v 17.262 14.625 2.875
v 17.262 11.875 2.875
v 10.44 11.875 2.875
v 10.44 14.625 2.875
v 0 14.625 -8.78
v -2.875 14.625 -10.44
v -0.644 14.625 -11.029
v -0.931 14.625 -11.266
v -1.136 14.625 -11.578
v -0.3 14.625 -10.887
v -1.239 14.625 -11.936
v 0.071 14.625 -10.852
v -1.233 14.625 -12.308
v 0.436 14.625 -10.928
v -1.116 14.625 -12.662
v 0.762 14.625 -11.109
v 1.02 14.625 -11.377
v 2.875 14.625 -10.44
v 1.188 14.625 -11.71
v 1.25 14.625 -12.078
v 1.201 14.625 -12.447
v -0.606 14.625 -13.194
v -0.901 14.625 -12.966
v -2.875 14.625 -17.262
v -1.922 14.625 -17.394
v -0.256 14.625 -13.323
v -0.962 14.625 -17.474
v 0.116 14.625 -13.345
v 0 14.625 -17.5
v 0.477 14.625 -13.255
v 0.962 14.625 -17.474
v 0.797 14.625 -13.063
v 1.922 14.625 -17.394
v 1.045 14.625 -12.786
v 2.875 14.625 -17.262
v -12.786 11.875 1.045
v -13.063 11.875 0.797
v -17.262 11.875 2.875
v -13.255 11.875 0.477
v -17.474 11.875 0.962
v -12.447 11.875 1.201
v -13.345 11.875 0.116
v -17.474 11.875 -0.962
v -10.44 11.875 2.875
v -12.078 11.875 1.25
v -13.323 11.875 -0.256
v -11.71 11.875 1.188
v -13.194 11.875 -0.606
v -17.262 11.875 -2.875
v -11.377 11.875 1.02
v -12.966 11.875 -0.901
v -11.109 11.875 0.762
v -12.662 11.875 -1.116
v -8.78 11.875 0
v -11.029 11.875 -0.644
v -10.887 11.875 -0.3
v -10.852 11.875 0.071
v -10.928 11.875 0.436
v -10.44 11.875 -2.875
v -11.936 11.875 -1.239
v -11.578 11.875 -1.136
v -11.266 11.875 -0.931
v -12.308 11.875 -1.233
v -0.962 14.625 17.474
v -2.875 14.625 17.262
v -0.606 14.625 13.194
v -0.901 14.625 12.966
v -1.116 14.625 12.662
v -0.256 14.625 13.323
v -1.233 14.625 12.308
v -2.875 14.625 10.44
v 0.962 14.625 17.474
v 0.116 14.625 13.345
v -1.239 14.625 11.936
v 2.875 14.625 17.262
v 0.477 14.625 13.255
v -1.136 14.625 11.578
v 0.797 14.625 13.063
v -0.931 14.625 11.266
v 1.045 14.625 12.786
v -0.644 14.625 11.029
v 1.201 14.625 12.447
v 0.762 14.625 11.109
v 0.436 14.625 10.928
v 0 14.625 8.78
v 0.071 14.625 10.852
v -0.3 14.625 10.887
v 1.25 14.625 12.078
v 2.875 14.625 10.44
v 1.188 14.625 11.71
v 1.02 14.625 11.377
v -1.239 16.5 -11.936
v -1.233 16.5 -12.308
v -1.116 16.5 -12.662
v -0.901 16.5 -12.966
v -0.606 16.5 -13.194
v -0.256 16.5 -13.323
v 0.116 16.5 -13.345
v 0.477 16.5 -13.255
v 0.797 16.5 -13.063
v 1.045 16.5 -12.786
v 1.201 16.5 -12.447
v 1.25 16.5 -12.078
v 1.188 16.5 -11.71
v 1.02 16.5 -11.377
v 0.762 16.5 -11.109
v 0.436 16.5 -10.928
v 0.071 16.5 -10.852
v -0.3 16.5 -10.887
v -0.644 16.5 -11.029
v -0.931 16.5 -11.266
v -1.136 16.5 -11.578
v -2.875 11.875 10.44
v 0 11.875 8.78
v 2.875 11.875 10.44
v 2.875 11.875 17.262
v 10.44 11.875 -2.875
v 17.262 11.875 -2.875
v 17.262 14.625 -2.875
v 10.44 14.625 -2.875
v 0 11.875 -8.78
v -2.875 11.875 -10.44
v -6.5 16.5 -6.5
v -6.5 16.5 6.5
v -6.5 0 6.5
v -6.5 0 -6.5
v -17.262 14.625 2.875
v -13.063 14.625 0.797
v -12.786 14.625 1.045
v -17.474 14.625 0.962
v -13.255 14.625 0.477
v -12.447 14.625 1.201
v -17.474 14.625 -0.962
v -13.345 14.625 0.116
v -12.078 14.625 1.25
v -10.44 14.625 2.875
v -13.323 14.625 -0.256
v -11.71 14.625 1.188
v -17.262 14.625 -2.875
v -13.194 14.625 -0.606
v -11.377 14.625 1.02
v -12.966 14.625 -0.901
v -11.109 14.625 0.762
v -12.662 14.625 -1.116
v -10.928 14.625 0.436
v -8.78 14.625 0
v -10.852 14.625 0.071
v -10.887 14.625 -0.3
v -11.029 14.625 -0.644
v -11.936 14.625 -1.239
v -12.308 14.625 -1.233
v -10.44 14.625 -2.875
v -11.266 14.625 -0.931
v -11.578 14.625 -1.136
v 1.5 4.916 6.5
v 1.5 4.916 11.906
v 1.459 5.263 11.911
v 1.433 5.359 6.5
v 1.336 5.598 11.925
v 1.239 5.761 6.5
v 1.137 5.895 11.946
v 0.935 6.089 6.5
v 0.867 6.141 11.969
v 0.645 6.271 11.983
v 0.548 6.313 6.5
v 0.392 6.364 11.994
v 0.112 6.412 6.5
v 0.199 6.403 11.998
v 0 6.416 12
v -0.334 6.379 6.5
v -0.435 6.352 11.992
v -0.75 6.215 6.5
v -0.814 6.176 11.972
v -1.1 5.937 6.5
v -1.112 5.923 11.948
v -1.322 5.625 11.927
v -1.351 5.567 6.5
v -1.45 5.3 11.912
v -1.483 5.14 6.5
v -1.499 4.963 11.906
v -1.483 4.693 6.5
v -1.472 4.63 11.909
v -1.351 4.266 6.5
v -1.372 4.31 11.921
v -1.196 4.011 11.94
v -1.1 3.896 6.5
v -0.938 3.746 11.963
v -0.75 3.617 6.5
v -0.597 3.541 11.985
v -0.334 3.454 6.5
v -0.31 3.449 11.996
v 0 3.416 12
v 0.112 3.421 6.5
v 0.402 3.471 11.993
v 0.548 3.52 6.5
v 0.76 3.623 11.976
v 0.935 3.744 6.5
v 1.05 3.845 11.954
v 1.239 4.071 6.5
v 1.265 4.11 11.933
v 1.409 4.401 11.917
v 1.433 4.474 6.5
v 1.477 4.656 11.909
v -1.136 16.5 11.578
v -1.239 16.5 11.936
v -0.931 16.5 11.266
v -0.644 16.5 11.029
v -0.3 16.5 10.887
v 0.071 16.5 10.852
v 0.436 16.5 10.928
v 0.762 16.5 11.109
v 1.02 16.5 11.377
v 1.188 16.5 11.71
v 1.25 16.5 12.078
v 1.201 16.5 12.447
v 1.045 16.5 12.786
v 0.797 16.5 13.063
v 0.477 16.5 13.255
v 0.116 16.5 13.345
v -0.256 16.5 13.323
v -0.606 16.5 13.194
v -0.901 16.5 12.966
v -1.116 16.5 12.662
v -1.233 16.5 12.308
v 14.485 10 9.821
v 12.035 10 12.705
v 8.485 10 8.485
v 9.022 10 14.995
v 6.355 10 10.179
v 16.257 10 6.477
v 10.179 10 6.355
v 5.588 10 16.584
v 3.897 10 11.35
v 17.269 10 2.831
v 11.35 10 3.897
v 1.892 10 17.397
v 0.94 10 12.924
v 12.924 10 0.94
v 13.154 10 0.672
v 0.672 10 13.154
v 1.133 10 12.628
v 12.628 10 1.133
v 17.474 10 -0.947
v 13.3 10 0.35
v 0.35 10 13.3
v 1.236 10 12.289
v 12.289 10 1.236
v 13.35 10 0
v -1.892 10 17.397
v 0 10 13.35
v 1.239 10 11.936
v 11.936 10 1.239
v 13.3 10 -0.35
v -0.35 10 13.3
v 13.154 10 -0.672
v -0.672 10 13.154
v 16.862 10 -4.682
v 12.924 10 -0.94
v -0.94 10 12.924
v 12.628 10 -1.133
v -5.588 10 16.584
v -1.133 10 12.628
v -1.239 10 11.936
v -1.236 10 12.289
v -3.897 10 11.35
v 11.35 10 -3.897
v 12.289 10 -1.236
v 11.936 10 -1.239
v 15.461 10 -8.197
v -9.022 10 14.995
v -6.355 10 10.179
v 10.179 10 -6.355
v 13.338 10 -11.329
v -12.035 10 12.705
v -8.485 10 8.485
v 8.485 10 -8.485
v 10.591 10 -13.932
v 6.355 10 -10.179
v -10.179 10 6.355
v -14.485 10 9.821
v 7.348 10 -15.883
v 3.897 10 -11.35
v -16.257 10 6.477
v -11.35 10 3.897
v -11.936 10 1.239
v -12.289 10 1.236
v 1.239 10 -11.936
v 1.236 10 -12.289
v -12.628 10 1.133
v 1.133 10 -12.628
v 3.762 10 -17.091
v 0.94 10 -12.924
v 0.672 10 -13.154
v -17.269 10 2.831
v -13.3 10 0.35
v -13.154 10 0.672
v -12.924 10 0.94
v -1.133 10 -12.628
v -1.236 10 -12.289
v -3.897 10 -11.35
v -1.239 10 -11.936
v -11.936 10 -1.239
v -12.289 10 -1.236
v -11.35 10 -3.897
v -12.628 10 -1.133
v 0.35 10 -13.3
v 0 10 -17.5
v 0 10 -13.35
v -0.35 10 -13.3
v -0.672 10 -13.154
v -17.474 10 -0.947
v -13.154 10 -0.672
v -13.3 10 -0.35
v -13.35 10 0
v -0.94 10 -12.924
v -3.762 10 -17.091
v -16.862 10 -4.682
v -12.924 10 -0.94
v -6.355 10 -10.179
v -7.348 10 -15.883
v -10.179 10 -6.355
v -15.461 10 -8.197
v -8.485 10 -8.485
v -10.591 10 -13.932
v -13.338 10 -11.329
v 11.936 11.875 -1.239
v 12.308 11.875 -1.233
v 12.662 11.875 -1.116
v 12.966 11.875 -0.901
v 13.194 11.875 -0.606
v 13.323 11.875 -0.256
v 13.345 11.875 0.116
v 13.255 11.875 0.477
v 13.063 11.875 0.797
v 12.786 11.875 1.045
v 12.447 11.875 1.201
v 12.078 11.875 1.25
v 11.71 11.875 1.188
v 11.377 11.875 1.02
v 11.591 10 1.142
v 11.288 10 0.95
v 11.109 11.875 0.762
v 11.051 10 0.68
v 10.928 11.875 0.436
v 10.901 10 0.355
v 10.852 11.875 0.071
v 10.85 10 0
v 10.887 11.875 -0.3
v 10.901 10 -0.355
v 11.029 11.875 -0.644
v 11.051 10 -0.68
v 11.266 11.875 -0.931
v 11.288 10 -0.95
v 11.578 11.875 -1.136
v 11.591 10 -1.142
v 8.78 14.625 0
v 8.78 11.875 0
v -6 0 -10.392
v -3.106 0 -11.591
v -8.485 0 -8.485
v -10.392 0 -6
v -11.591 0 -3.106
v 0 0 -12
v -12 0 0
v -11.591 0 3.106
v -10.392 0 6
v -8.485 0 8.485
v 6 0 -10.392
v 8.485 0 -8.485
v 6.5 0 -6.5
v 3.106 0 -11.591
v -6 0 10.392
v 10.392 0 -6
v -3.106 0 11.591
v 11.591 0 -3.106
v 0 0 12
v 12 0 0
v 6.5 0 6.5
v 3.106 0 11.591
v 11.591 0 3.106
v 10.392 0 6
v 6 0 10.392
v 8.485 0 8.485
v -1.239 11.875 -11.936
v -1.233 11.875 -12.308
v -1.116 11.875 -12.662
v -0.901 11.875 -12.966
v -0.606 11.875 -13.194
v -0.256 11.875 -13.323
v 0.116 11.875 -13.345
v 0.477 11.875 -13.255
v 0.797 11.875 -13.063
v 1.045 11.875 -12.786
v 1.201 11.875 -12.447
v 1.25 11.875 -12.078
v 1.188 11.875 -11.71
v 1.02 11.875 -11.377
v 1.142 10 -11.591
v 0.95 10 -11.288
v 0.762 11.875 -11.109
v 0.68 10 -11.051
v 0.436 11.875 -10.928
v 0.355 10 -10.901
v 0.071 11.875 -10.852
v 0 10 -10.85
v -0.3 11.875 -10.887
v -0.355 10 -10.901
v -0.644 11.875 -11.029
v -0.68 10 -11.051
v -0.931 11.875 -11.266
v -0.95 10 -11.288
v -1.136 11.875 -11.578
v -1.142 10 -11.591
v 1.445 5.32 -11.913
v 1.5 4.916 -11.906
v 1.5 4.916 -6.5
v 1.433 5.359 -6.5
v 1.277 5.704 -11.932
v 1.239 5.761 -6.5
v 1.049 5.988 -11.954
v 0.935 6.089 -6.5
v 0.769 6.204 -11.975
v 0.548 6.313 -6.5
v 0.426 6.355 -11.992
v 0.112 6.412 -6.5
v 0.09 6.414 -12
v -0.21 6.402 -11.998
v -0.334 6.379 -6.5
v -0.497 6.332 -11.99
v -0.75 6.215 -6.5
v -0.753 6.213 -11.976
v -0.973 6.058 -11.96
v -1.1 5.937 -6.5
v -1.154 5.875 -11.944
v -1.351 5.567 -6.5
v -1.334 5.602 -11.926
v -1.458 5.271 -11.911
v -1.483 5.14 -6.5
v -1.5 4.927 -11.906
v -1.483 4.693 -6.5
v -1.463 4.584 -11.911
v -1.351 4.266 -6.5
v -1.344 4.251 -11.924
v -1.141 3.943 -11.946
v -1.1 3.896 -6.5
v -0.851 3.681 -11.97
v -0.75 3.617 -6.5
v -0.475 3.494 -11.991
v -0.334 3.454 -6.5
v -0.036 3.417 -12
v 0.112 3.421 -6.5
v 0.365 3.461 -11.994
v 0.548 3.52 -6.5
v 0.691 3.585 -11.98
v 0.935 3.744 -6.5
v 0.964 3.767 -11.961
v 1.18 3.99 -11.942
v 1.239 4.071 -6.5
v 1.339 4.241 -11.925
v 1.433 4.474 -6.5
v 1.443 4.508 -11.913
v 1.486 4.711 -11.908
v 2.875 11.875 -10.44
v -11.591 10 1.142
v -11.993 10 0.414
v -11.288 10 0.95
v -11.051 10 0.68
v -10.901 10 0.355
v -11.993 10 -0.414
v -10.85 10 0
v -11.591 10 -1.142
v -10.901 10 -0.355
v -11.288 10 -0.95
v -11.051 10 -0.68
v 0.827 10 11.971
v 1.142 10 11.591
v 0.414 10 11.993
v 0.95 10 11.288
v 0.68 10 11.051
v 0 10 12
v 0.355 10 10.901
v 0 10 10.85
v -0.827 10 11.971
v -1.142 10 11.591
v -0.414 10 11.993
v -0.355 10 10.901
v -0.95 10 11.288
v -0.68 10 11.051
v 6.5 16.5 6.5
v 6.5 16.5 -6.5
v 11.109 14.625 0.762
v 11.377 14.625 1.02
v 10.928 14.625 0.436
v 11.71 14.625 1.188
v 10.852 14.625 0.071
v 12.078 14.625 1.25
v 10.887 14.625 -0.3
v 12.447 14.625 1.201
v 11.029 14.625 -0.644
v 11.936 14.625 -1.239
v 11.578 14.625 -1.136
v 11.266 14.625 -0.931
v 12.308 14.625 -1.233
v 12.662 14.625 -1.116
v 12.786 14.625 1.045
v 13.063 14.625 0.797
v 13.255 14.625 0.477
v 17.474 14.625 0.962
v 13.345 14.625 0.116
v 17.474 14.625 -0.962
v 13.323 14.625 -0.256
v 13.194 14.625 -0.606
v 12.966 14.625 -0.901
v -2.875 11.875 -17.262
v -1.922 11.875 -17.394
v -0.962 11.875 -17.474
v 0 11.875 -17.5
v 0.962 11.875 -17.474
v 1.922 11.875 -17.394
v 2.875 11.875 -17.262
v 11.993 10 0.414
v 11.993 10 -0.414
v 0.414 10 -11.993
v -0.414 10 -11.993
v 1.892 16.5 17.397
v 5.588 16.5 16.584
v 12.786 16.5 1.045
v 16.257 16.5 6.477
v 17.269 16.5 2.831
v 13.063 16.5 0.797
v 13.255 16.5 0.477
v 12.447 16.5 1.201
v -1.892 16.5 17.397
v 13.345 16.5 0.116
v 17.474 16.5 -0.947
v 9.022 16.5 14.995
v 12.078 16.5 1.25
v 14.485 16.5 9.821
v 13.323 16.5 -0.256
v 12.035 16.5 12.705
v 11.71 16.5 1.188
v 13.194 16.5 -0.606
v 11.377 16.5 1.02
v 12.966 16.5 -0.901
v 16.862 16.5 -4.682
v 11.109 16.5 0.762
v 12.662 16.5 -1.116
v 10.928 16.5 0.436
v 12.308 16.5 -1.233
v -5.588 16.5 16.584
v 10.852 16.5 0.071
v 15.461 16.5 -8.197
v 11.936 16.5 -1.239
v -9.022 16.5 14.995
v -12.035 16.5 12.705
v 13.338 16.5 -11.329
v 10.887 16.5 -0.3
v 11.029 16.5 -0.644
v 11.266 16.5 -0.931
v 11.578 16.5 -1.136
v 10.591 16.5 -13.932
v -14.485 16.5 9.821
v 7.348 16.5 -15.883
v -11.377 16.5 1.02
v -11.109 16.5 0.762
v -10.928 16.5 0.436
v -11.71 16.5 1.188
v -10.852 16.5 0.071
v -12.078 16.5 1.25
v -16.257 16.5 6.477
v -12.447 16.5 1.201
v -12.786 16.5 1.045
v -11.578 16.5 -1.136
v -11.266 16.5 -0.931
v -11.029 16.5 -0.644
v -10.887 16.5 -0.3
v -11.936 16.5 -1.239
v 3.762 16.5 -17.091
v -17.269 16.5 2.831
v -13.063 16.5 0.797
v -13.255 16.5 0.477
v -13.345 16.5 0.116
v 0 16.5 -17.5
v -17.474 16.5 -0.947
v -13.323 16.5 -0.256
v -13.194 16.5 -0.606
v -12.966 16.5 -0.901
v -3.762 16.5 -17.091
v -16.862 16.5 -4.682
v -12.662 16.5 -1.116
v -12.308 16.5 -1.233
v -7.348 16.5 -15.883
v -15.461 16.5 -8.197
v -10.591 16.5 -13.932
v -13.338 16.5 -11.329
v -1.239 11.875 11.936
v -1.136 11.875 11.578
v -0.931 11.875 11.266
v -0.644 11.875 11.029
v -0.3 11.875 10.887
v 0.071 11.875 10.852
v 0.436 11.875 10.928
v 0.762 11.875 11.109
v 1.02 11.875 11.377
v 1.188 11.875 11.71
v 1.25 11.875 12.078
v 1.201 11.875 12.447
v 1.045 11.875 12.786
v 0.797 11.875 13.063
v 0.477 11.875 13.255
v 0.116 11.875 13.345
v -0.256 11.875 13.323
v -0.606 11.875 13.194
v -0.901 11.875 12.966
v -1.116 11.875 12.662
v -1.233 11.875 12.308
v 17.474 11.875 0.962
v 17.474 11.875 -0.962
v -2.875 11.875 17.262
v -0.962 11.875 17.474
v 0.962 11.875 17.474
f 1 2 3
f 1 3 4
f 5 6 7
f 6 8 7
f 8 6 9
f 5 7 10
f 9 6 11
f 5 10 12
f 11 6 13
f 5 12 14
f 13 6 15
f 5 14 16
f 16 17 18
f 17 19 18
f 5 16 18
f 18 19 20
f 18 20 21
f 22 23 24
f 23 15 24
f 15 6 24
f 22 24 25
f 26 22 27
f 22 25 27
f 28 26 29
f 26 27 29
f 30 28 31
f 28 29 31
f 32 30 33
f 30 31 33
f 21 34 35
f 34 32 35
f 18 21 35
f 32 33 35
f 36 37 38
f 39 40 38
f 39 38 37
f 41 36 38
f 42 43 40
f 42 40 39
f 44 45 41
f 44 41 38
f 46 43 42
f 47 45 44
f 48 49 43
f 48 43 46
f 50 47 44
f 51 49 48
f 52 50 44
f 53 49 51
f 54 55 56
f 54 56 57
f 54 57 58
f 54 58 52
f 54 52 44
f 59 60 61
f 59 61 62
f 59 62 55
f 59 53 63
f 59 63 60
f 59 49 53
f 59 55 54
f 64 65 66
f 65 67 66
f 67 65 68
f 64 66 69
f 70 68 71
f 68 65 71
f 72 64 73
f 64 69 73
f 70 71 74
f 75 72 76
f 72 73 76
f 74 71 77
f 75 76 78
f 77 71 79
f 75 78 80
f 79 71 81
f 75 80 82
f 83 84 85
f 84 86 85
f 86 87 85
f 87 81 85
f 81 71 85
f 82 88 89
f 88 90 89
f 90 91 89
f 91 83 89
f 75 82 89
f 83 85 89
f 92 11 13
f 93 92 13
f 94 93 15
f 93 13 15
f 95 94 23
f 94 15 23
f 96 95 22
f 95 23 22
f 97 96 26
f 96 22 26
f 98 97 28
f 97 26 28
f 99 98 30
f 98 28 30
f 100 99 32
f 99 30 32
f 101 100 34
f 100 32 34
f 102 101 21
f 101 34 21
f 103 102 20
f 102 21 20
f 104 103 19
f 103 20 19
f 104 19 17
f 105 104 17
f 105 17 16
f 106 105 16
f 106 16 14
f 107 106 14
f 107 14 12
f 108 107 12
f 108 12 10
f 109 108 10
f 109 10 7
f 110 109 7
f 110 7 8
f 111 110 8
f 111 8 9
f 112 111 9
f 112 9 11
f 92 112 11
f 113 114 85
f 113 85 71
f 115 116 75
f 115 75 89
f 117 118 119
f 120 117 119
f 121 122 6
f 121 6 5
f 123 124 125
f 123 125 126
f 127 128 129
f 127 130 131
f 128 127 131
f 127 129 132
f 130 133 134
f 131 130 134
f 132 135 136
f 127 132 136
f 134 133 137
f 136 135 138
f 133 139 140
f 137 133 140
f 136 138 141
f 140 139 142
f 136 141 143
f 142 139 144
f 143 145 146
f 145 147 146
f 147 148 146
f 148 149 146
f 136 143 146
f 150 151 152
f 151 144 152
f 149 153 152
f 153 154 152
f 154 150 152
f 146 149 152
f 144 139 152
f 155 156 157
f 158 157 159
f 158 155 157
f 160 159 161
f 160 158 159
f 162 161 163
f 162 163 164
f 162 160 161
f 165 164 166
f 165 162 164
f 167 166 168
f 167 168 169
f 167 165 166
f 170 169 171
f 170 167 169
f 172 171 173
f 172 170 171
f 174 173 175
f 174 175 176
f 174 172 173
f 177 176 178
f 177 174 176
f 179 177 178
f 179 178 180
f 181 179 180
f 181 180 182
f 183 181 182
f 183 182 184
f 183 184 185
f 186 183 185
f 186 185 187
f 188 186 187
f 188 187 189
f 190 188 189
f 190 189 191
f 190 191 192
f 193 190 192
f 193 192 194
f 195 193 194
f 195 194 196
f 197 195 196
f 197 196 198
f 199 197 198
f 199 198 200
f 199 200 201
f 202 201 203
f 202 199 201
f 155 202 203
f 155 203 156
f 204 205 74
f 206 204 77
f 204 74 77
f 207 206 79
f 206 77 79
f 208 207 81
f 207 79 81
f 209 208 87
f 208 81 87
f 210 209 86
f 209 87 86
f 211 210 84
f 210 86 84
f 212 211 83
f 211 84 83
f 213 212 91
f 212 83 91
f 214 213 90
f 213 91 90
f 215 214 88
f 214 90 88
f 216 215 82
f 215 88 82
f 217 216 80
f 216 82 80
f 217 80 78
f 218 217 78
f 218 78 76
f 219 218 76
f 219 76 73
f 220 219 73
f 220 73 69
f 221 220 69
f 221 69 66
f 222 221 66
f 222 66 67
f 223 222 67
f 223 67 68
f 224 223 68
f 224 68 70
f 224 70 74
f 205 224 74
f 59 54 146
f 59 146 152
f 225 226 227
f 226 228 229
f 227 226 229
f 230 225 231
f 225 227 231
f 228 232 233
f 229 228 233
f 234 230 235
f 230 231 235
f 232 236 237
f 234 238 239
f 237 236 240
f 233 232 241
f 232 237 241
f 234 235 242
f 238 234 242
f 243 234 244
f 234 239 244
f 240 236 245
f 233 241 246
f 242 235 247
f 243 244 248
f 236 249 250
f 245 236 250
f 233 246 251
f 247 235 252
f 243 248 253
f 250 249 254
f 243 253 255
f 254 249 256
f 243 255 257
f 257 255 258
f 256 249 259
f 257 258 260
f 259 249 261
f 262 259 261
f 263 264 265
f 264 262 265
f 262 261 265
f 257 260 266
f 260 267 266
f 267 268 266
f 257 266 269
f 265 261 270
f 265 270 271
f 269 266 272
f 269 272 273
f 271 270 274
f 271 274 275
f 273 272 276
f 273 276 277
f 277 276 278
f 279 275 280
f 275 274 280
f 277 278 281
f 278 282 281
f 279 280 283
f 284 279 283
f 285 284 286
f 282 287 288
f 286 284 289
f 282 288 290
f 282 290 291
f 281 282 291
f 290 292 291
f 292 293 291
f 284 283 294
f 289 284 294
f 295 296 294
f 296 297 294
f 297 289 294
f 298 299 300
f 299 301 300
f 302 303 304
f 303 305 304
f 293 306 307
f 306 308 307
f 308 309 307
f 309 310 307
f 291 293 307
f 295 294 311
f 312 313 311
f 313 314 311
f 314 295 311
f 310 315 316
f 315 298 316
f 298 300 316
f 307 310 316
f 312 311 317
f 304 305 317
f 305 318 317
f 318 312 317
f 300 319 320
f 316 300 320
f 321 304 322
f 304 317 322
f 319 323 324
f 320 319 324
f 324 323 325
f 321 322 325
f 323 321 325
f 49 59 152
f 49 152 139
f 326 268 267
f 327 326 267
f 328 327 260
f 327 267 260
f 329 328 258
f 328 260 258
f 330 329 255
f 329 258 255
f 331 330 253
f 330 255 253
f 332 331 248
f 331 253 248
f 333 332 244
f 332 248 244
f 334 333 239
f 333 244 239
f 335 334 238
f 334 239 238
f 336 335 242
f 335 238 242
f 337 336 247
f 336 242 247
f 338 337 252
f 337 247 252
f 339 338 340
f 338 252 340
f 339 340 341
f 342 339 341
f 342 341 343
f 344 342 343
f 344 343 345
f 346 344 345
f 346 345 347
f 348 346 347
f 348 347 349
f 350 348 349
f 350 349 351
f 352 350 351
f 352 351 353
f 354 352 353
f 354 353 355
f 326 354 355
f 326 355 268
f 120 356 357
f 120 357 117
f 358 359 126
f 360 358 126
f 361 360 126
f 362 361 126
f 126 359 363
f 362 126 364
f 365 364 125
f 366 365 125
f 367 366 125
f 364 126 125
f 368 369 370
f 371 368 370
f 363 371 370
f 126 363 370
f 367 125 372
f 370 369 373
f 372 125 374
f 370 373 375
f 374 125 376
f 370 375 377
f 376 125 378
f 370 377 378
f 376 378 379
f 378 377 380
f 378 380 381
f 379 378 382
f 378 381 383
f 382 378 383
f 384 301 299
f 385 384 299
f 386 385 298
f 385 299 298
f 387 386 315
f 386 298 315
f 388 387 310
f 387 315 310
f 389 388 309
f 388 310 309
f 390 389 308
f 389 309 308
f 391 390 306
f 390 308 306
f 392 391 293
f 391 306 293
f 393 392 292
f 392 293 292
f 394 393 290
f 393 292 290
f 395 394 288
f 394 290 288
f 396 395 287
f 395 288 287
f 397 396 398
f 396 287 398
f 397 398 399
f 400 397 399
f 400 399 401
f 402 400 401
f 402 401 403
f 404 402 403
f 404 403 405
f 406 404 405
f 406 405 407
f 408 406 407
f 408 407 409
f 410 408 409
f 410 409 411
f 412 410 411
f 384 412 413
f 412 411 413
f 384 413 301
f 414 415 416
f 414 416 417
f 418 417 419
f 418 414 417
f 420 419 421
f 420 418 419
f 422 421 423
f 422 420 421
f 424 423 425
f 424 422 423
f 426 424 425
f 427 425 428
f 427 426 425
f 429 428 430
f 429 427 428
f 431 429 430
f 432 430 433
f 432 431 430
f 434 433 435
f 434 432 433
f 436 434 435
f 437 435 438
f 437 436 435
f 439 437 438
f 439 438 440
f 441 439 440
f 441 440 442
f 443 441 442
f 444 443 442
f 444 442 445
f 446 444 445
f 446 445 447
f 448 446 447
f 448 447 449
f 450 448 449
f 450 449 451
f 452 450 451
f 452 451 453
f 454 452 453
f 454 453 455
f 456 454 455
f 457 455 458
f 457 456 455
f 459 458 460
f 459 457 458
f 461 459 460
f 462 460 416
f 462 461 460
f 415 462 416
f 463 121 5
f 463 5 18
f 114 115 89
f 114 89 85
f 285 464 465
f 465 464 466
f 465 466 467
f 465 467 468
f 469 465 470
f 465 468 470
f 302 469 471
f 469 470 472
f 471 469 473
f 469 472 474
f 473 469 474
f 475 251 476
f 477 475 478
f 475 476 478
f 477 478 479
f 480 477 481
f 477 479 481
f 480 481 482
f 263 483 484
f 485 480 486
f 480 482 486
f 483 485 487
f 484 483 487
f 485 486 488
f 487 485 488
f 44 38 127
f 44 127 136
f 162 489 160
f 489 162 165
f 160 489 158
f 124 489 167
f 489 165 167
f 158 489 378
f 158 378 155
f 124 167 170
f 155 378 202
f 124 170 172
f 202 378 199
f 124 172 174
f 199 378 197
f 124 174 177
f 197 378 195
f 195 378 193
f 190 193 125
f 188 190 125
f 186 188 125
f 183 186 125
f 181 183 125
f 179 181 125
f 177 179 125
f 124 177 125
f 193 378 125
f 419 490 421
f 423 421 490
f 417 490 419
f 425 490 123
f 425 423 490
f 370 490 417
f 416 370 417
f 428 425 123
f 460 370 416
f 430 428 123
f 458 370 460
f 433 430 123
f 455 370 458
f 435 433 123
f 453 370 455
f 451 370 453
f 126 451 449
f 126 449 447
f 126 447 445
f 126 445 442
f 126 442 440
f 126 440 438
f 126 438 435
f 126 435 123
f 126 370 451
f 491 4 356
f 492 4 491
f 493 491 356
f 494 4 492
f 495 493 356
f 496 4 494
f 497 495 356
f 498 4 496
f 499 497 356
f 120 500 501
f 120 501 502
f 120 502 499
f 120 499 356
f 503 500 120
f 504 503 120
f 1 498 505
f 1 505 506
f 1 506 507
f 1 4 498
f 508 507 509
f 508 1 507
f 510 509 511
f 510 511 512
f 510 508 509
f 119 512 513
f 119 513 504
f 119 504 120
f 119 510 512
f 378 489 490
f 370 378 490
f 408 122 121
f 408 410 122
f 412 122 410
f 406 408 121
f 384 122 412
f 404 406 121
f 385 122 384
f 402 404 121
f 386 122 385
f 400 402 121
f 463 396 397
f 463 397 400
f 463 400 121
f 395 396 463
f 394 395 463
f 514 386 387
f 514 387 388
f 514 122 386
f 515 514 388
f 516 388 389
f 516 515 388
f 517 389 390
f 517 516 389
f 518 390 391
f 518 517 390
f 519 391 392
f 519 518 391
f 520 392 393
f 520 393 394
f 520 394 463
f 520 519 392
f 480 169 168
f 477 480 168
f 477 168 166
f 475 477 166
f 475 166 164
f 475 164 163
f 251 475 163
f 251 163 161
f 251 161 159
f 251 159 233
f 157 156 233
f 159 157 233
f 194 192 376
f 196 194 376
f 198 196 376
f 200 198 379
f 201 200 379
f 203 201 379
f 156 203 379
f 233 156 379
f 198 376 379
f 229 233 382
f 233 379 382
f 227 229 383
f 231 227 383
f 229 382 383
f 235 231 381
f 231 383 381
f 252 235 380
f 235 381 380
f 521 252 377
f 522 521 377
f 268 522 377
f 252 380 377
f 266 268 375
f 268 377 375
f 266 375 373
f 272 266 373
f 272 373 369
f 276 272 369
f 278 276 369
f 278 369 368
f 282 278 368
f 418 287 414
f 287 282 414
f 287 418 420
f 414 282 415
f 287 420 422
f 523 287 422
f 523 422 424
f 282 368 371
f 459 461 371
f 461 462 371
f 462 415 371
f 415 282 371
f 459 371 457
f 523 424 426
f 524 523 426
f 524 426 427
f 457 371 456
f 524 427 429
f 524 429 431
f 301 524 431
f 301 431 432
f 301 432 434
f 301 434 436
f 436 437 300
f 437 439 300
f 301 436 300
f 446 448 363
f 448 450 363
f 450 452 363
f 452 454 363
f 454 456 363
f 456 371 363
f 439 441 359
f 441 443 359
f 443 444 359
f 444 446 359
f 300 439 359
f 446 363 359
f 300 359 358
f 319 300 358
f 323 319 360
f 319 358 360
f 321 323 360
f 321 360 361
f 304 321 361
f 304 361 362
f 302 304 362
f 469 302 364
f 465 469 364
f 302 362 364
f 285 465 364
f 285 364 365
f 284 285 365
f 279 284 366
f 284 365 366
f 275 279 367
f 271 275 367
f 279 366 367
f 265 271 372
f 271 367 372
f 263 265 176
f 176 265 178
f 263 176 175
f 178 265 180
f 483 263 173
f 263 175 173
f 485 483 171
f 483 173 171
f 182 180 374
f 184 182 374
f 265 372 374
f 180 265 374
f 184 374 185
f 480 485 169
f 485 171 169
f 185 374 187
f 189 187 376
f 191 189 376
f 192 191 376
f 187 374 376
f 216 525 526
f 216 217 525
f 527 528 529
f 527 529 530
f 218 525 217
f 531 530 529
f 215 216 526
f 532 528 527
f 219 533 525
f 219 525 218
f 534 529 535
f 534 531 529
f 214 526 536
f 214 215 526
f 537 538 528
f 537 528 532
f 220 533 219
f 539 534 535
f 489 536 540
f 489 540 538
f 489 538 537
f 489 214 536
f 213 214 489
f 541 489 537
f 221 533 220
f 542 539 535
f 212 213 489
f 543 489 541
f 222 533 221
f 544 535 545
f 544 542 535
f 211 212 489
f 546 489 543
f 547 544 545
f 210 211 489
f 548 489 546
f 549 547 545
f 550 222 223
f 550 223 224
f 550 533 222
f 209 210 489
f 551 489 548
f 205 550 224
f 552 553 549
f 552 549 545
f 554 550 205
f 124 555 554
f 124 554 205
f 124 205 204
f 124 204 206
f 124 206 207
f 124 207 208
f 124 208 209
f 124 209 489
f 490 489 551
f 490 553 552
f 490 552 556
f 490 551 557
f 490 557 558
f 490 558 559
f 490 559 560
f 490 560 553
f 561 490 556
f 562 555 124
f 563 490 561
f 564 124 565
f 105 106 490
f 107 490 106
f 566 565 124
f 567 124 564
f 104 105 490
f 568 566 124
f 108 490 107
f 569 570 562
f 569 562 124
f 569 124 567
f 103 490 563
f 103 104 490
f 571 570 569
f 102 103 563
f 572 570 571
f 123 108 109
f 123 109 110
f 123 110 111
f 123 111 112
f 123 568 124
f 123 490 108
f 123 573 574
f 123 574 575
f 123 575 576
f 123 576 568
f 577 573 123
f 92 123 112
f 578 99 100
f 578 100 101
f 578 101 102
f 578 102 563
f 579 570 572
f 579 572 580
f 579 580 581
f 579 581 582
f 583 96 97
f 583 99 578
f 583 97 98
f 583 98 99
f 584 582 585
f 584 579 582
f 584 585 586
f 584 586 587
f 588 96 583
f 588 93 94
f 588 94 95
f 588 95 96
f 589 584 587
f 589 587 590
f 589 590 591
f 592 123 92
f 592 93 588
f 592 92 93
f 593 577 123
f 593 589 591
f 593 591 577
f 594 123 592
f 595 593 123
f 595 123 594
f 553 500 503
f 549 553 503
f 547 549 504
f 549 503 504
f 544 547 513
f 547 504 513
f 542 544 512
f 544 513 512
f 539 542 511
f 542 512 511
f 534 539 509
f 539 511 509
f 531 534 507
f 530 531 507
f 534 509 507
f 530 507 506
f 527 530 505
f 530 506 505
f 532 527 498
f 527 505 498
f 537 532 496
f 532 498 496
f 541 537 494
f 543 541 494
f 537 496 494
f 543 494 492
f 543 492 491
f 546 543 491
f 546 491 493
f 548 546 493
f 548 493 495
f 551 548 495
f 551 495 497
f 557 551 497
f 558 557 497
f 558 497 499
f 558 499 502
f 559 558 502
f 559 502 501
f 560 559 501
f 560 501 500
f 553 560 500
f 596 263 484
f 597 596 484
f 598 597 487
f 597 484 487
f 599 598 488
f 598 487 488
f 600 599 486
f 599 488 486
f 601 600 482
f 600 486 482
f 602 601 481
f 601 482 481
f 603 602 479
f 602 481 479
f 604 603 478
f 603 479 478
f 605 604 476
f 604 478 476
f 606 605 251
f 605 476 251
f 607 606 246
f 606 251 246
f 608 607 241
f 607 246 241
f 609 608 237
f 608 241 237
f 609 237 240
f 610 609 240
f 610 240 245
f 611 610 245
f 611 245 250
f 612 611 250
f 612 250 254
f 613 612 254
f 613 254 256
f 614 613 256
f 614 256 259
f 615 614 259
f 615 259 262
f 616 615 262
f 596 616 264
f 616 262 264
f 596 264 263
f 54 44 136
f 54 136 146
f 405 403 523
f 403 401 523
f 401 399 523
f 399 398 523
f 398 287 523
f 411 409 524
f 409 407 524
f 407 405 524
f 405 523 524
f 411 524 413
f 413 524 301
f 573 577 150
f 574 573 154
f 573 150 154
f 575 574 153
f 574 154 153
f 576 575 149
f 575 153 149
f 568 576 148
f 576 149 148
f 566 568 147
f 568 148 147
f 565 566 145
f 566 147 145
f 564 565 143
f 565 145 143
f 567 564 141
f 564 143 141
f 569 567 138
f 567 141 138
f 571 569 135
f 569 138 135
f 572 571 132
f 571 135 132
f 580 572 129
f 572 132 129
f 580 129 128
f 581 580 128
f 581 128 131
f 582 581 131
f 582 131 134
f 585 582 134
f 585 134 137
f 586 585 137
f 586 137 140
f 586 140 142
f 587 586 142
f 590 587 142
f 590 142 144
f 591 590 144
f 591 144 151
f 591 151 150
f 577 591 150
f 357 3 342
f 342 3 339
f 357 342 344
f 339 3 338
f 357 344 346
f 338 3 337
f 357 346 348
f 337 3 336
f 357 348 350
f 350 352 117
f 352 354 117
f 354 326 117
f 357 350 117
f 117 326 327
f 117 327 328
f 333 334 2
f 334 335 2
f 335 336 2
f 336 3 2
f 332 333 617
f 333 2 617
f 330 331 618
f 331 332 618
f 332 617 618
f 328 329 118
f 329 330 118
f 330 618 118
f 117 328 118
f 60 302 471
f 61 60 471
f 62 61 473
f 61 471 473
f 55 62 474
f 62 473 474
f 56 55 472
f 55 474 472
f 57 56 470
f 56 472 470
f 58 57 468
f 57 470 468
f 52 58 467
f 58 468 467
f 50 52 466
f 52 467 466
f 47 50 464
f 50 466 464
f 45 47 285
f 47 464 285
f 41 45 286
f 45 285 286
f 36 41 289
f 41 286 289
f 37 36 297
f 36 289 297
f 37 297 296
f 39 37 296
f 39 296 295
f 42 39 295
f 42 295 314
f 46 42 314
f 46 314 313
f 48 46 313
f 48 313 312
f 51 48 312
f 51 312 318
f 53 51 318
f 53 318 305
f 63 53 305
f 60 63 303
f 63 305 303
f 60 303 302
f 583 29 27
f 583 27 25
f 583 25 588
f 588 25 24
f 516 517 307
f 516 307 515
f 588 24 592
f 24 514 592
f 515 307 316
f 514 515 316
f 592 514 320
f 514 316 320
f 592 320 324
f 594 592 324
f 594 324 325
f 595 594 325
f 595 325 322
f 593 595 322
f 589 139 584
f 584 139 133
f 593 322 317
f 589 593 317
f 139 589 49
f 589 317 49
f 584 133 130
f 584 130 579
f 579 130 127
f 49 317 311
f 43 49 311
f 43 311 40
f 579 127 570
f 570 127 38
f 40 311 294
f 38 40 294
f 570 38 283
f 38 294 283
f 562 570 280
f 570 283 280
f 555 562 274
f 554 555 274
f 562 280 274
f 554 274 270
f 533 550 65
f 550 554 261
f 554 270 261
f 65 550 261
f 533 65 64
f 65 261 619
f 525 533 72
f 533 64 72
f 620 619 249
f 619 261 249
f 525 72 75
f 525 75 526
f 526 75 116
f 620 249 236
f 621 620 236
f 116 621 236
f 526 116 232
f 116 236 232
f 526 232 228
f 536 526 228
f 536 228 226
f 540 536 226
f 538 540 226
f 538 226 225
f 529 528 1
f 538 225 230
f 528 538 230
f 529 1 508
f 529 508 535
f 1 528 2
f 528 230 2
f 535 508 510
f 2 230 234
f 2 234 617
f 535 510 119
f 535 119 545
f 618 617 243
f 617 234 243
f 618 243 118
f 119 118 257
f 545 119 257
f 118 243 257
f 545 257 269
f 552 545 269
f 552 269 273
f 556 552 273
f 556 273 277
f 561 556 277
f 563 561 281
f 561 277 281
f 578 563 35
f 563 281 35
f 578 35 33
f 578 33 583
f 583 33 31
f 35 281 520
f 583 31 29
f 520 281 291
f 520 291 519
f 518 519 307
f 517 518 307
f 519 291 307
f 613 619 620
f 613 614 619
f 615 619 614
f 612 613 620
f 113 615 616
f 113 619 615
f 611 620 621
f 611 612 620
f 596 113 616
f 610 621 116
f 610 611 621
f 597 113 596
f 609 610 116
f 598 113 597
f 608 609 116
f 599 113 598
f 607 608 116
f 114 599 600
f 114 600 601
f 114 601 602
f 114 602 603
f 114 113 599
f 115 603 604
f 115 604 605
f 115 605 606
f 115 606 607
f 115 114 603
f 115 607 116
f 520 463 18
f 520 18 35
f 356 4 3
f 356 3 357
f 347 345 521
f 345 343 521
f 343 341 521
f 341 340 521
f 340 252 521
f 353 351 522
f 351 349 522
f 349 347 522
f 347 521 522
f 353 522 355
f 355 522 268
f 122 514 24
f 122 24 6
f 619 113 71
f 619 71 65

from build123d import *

# Parameters (mm, degrees)
SKETCH1_R                      = 12
SKETCH1_W                      = 13
SKETCH1_H                      = 13
BOSS_EXTRUDE1_DEPTH            = 10
SKETCH2_R                      = 17.5
BOSS_EXTRUDE2_DEPTH            = 6.5
CUT_EXTRUDE1_REACH             = 28.693
SKETCH3_R                      = 1.25
CUT_EXTRUDE2_DEPTH             = 30.744747435
CUT_EXTRUDE2_DEPTH_BACK        = 30.744747435
SKETCH4_R                      = 1.5
CUT_EXTRUDE3_REACH             = 28.693
SKETCH6_W                      = 13
SKETCH6_H                      = 13
CUT_EXTRUDE3_DIRECTION_2_DEPTH = 10
SKETCH8_W                      = 5.75
SKETCH8_H                      = 2.75
CUT_EXTRUDE4_DEPTH             = 5
CUT_EXTRUDE5_DEPTH             = 2.75
CIRPATTERN1_START              = 11.875
CIRPATTERN1_OUTLINE_R          = 1.25
CIRPATTERN1_DEPTH              = 2.75


# Read off the part's stored shape, not the designer's step: CirPattern1
with BuildPart() as part:
    # Sketch1 → Boss-Extrude1 (new body)
    with BuildSketch(Plane(origin=(0, 0, 0), x_dir=(1, 0, 0), z_dir=(0, 1, 0))):
        with Locations(Location((0, 0, 0), (0, 0, 270))):
            Circle(SKETCH1_R)
        Rectangle(SKETCH1_W, SKETCH1_H, mode=Mode.SUBTRACT)
    extrude(amount=BOSS_EXTRUDE1_DEPTH)

    # Sketch2 → Boss-Extrude2 (add)
    with BuildSketch(Plane(origin=(0, 10, 0), x_dir=(1, 0, 0), z_dir=(0, 1, 0))):
        with Locations(Location((0, 0, 0), (0, 0, 90))):
            Circle(SKETCH2_R)
    extrude(amount=BOSS_EXTRUDE2_DEPTH)

    # Sketch3 → Cut-Extrude1 (cut, up to next)
    with BuildSketch(Plane.XZ.offset(-10), mode=Mode.PRIVATE) as cut_extrude1_sk1:
        with Locations(Location((12.1, 0, 0), (0, 0, 262.453989537))):
            Circle(SKETCH3_R)
    cut_extrude1_tool1 = extrude(cut_extrude1_sk1.sketch, amount=-CUT_EXTRUDE1_REACH, mode=Mode.PRIVATE) & part.part
    # Sketch3 → Cut-Extrude1 (cut, up to next)
    with BuildSketch(Plane.XZ.offset(-10), mode=Mode.PRIVATE) as cut_extrude1_sk2:
        with Locations(Location((0, -12.1, 0), (0, 0, 172.453989537))):
            Circle(SKETCH3_R)
    cut_extrude1_tool2 = extrude(cut_extrude1_sk2.sketch, amount=-CUT_EXTRUDE1_REACH, mode=Mode.PRIVATE) & part.part
    # Sketch3 → Cut-Extrude1 (cut, up to next)
    with BuildSketch(Plane.XZ.offset(-10), mode=Mode.PRIVATE) as cut_extrude1_sk3:
        with Locations(Location((-12.1, 0, 0), (0, 0, 277.546010463))):
            Circle(SKETCH3_R)
    cut_extrude1_tool3 = extrude(cut_extrude1_sk3.sketch, amount=-CUT_EXTRUDE1_REACH, mode=Mode.PRIVATE) & part.part
    # Sketch3 → Cut-Extrude1 (cut, up to next)
    with BuildSketch(Plane.XZ.offset(-10), mode=Mode.PRIVATE) as cut_extrude1_sk4:
        with Locations(Location((0, 12.1, 0), (0, 0, 187.546010463))):
            Circle(SKETCH3_R)
    cut_extrude1_tool4 = extrude(cut_extrude1_sk4.sketch, amount=-CUT_EXTRUDE1_REACH, mode=Mode.PRIVATE) & part.part
    add(cut_extrude1_tool1.solids().sort_by_distance((12.1, 10, 0))[0], mode=Mode.SUBTRACT)
    add(cut_extrude1_tool2.solids().sort_by_distance((0, 10, -12.1))[0], mode=Mode.SUBTRACT)
    add(cut_extrude1_tool3.solids().sort_by_distance((-12.1, 10, 0))[0], mode=Mode.SUBTRACT)
    add(cut_extrude1_tool4.solids().sort_by_distance((0, 10, 12.1))[0], mode=Mode.SUBTRACT)

    # Sketch4 → Cut-Extrude2 (cut, two sides: drawn at the far end of the back side and taken through both)
    with BuildSketch(Plane.XY.offset(-CUT_EXTRUDE2_DEPTH_BACK)):
        with Locations((0, 4.916404418)):
            Circle(SKETCH4_R)
    extrude(amount=CUT_EXTRUDE2_DEPTH + CUT_EXTRUDE2_DEPTH_BACK, mode=Mode.SUBTRACT)

    # Sketch6 → Cut-Extrude3 (cut, up to next)
    with BuildSketch(Plane(origin=(0, 10, 0), x_dir=(-1, 0, 0), z_dir=(0, -1, 0)), mode=Mode.PRIVATE) as cut_extrude3_sk1:
        Rectangle(SKETCH6_W, SKETCH6_H)
    cut_extrude3_tool1 = extrude(cut_extrude3_sk1.sketch, amount=-CUT_EXTRUDE3_REACH, mode=Mode.PRIVATE) & part.part
    add(cut_extrude3_tool1.solids().sort_by_distance((0, 10, 0))[0], mode=Mode.SUBTRACT)

    # Sketch6 → Cut-Extrude3 direction 2 (cut)
    with BuildSketch(Plane(origin=(0, 10, 0), x_dir=(-1, 0, 0), z_dir=(0, -1, 0))):
        Rectangle(SKETCH6_W, SKETCH6_H)
    extrude(amount=CUT_EXTRUDE3_DIRECTION_2_DEPTH, mode=Mode.SUBTRACT)

    # Sketch8 → Cut-Extrude4 (cut)
    with BuildSketch(Plane(origin=(17.5, 0, 0), x_dir=(0, 0, -1), z_dir=(1, 0, 0))):
        with Locations((0, 13.25)):
            Rectangle(SKETCH8_W, SKETCH8_H)
    extrude(amount=-CUT_EXTRUDE4_DEPTH, mode=Mode.SUBTRACT)

    # Sketch9 → Cut-Extrude5 (cut)
    with BuildSketch(Plane.XZ.offset(-14.625)):
        Polygon((15.419764048, 0), (13.759882024, 2.875), (10.440117976, 2.875), (8.780235952, 0), (10.440117976, -2.875), (13.759882024, -2.875), align=None)
    extrude(amount=CUT_EXTRUDE5_DEPTH, mode=Mode.SUBTRACT)

    # CirPattern1 outline → CirPattern1 (cut)
    # profile 1 of 3: a face of its own
    with BuildSketch(Plane(origin=(0, 0, 0), x_dir=(1, 0, 0), z_dir=(0, 1, 0)).offset(CIRPATTERN1_START)):
        with BuildLine():
            Line((-8.780235952, 0), (-10.440117976, 2.875))
            Line((-10.440117976, 2.875), (-17.26222393, 2.875))
            ThreePointArc((-17.26222393, 2.875), (-17.5, 0), (-17.26222393, -2.875))
            Line((-17.26222393, -2.875), (-10.440117976, -2.875))
            Line((-10.440117976, -2.875), (-8.780235952, 0))
        make_face()
        with Locations((-12.1, 0)):
            Circle(CIRPATTERN1_OUTLINE_R, mode=Mode.SUBTRACT)
    # profile 2 of 3: a face of its own
    with BuildSketch(Plane(origin=(0, 0, 0), x_dir=(1, 0, 0), z_dir=(0, 1, 0)).offset(CIRPATTERN1_START)):
        with BuildLine():
            ThreePointArc((2.875, 17.26222393), (0, 17.5), (-2.875, 17.26222393))
            Line((-2.875, 17.26222393), (-2.875, 10.440117976))
            Line((-2.875, 10.440117976), (0, 8.780235952))
            Line((0, 8.780235952), (2.875, 10.440117976))
            Line((2.875, 10.440117976), (2.875, 17.26222393))
        make_face()
        with Locations((0, 12.1)):
            Circle(CIRPATTERN1_OUTLINE_R, mode=Mode.SUBTRACT)
    # profile 3 of 3: a face of its own
    with BuildSketch(Plane(origin=(0, 0, 0), x_dir=(1, 0, 0), z_dir=(0, 1, 0)).offset(CIRPATTERN1_START)):
        with BuildLine():
            Line((-2.875, -10.440117976), (-2.875, -17.26222393))
            ThreePointArc((-2.875, -17.26222393), (0, -17.5), (2.875, -17.26222393))
            Line((2.875, -17.26222393), (2.875, -10.440117976))
            Line((2.875, -10.440117976), (0, -8.780235952))
            Line((0, -8.780235952), (-2.875, -10.440117976))
        make_face()
        with Locations((0, -12.1)):
            Circle(CIRPATTERN1_OUTLINE_R, mode=Mode.SUBTRACT)
    extrude(amount=CIRPATTERN1_DEPTH, mode=Mode.SUBTRACT)


solid = part.part
